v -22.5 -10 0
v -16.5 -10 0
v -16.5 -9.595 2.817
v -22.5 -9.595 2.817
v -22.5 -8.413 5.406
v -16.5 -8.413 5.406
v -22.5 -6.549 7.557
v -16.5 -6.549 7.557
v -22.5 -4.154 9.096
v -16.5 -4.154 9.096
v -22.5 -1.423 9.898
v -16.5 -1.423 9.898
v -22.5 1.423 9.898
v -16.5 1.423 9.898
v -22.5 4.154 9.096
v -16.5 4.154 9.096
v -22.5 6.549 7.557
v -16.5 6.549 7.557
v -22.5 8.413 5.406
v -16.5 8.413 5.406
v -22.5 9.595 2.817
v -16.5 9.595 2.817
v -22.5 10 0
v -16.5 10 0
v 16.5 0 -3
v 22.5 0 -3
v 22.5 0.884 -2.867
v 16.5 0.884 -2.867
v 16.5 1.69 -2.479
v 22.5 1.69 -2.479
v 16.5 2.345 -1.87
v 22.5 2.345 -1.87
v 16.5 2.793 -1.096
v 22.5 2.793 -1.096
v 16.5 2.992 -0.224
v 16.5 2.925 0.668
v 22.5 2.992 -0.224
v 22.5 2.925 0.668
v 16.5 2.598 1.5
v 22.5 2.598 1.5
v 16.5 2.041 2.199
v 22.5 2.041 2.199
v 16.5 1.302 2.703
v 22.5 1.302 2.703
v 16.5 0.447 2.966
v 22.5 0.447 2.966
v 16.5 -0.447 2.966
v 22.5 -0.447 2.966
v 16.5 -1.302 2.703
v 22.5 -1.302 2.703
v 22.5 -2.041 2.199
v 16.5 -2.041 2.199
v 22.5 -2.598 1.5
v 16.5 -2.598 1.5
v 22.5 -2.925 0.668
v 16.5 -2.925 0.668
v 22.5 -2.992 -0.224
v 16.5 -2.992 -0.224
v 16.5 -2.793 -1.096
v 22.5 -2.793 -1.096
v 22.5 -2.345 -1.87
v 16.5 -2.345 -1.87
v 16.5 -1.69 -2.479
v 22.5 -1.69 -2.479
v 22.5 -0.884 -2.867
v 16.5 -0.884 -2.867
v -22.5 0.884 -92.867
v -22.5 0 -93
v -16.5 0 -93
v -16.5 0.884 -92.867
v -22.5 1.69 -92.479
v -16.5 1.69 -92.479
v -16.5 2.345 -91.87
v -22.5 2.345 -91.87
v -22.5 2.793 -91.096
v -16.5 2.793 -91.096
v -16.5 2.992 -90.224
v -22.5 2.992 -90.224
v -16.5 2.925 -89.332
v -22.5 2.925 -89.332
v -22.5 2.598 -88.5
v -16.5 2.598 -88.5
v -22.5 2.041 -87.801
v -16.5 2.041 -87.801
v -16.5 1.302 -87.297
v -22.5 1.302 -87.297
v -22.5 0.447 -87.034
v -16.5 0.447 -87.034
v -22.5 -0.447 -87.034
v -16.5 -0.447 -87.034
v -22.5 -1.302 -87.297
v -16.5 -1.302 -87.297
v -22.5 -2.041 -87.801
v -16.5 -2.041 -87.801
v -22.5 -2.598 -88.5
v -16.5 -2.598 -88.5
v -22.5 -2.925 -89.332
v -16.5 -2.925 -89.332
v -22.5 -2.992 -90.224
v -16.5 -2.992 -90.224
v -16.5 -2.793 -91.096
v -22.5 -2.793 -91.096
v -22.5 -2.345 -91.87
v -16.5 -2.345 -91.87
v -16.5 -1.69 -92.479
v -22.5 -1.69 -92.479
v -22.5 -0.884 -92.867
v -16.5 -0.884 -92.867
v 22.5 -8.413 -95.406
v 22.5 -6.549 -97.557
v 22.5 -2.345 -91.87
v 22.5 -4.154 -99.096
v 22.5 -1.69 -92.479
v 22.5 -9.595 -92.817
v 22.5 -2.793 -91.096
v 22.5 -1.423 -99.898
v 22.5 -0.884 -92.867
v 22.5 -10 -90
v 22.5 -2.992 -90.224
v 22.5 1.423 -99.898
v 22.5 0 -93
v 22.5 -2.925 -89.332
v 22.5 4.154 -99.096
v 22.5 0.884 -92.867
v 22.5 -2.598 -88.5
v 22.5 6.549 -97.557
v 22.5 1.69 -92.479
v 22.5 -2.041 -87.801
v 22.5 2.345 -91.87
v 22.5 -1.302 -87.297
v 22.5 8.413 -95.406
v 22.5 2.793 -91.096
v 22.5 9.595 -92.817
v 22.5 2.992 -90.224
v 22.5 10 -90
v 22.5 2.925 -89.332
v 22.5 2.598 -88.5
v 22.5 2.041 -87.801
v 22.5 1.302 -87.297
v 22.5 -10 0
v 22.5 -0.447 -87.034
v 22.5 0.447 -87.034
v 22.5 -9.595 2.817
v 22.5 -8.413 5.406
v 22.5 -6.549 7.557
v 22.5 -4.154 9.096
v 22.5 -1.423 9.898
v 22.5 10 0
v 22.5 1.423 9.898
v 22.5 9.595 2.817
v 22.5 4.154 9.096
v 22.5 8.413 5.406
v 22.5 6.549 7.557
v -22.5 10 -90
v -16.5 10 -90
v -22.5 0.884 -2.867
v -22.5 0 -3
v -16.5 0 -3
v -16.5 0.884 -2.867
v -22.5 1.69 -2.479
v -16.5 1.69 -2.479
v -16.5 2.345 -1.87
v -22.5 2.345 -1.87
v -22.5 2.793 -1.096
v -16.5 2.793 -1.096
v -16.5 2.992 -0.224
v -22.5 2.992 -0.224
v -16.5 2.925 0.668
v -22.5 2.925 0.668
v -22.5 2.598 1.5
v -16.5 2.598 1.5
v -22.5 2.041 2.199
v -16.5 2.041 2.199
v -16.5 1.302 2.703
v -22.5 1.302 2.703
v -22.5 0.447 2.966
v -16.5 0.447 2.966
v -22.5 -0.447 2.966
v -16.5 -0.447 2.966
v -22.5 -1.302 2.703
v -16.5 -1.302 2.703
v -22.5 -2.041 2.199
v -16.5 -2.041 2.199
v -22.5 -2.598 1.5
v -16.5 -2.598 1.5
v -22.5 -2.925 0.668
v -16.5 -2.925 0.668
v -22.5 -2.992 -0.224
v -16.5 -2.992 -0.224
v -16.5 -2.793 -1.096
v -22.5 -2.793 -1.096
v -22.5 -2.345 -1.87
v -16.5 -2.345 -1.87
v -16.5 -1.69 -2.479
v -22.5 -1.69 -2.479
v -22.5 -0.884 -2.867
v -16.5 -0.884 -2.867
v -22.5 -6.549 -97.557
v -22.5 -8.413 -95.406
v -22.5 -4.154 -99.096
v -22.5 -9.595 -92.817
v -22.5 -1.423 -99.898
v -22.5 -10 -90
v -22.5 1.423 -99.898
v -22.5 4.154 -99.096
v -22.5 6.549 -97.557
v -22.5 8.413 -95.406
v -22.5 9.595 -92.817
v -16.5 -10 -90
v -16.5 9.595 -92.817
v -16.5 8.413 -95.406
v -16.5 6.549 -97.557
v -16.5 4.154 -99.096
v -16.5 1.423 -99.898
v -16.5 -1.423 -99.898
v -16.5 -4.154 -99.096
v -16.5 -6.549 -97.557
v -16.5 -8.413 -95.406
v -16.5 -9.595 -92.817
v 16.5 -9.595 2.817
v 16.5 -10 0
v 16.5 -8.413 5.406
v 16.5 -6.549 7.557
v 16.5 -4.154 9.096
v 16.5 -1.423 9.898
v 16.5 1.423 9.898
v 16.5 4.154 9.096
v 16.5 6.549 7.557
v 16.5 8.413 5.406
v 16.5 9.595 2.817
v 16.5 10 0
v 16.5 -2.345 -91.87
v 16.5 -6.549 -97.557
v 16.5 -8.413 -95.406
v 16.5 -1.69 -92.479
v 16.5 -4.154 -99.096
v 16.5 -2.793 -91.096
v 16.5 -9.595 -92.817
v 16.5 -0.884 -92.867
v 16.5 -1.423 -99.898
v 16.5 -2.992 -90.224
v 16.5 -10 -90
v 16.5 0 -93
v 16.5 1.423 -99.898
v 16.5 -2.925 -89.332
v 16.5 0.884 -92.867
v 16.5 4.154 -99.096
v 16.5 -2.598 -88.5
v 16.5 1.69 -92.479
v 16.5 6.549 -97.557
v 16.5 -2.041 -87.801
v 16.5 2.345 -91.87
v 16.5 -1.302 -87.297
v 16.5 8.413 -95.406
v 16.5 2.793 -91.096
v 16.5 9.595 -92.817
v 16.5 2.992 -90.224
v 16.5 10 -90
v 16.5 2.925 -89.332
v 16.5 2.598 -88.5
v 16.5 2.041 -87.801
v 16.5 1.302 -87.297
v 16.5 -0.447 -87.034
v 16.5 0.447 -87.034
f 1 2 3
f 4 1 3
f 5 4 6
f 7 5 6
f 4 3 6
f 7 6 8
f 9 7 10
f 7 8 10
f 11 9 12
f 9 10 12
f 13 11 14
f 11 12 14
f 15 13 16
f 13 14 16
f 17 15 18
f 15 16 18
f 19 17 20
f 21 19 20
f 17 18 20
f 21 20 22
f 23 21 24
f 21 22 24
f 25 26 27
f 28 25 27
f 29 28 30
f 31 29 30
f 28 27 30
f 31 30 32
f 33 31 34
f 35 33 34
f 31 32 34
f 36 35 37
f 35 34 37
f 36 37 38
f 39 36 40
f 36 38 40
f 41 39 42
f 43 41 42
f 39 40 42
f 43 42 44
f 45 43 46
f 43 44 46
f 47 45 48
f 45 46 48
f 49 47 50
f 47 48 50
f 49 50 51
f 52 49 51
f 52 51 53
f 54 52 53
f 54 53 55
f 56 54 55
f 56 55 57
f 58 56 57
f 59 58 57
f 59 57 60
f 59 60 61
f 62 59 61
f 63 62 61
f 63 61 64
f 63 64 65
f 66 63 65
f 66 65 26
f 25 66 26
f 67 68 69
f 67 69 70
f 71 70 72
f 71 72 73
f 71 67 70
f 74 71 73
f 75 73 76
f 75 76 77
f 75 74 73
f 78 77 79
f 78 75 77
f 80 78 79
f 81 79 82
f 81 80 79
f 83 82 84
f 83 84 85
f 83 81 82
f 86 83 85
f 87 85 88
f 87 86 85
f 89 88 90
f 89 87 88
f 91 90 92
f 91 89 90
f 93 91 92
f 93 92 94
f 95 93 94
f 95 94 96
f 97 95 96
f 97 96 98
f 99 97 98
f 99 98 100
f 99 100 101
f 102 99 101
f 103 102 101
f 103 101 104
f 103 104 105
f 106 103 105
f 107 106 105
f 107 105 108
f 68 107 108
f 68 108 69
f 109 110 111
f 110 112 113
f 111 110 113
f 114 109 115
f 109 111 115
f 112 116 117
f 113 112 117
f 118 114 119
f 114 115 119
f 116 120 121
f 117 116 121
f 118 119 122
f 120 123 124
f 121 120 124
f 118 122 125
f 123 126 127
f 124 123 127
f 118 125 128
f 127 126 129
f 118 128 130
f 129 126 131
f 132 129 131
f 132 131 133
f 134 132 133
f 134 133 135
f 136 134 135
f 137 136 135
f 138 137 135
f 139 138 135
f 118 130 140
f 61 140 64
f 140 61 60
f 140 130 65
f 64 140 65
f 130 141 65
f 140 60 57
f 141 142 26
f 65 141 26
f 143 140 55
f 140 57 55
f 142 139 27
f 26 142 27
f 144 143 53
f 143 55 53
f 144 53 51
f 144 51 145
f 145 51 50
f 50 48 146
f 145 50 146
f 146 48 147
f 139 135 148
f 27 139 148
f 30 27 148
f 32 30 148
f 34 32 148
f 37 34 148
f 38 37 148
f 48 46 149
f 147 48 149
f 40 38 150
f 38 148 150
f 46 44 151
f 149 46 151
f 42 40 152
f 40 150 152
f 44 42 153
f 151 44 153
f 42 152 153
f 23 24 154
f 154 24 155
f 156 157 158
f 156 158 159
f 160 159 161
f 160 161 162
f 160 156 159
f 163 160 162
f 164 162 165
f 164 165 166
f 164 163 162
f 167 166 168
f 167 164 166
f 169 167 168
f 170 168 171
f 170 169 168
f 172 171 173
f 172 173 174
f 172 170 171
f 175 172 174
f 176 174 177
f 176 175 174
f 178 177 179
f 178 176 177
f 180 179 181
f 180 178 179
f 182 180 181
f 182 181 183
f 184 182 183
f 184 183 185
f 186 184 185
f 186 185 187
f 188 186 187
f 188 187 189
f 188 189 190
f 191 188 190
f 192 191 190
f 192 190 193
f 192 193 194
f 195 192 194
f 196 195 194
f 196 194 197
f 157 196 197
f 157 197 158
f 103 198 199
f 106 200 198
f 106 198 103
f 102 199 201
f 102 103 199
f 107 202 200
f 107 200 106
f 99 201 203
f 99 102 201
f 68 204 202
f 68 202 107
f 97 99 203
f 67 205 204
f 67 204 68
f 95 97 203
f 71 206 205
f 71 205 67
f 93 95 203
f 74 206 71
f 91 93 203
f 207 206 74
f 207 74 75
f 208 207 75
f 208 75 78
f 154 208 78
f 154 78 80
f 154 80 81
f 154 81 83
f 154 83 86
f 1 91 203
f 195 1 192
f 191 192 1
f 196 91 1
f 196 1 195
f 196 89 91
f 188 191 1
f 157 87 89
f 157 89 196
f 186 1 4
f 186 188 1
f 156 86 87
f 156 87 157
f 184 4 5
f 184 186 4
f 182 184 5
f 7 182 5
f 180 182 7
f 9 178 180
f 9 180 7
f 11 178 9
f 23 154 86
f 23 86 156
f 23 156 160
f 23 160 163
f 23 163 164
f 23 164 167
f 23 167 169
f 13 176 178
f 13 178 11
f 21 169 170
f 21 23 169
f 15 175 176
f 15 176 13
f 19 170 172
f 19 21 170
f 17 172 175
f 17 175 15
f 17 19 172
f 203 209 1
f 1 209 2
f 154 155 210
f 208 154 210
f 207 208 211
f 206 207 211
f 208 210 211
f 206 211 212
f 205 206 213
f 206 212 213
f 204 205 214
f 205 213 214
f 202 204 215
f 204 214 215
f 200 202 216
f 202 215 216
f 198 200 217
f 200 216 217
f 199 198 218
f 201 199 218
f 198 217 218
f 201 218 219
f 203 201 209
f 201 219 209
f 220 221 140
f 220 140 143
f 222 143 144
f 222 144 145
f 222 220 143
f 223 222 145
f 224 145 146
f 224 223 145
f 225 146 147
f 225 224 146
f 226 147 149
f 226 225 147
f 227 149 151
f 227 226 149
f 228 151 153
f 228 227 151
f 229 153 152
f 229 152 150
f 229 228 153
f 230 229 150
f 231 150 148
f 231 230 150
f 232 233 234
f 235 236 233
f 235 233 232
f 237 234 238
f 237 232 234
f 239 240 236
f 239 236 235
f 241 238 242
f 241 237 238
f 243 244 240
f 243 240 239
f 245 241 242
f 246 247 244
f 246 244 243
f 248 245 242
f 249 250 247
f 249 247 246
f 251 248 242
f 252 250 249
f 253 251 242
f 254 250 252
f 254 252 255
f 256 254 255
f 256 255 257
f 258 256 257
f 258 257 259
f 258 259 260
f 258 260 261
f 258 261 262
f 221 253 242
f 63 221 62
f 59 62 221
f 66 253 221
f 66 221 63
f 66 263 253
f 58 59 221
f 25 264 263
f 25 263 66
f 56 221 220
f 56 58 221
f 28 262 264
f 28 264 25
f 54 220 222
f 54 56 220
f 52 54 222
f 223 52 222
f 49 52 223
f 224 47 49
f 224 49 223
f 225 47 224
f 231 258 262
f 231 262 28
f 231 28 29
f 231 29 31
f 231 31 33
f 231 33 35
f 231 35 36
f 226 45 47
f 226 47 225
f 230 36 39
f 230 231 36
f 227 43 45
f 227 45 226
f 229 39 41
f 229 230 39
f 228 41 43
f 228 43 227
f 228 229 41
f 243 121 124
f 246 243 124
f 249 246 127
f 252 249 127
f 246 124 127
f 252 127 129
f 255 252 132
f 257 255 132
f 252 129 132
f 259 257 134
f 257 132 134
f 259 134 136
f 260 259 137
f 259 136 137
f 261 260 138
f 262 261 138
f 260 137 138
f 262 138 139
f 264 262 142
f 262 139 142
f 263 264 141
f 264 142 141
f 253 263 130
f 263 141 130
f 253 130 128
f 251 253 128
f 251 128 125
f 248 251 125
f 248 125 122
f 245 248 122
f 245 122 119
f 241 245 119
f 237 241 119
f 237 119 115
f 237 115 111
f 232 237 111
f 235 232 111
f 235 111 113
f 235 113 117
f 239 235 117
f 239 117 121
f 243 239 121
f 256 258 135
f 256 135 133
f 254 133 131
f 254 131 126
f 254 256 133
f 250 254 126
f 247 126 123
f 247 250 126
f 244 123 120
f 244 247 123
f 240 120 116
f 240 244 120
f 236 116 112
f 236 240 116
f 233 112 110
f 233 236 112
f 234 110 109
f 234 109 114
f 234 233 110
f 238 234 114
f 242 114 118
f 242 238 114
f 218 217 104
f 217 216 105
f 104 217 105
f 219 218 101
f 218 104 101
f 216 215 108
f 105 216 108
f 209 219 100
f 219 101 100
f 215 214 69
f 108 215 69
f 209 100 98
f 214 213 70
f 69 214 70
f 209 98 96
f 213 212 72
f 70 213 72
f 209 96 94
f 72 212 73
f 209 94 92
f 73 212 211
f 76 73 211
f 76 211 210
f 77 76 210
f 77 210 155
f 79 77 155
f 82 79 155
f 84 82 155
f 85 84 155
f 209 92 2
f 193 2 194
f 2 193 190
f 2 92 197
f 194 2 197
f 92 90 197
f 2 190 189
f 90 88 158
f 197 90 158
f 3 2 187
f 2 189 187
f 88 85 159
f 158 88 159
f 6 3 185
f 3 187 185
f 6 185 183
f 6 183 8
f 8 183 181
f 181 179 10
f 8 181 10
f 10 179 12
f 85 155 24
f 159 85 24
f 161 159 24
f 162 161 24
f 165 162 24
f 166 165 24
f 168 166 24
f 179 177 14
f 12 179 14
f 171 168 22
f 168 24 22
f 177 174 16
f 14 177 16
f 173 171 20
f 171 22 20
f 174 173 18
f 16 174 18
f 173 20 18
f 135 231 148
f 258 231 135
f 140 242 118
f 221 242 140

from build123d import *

# Parameters (mm, degrees)
BOSS_EXTRUDE1_DEPTH     = 6
SKETCH2_R               = 3
CUT_EXTRUDE1_DEPTH      = 1
CUT_EXTRUDE1_DEPTH_BACK = 7


with BuildPart() as part:
    # Sketch1 → Boss-Extrude1 (new body)
    with BuildSketch(Plane(origin=(16.5, 0, 0), x_dir=(0, 0, -1), z_dir=(1, 0, 0))):
        with BuildLine():
            Line((0, 10), (90, 10))
            ThreePointArc((90, 10), (100, 0), (90, -10))
            Line((90, -10), (0, -10))
            ThreePointArc((0, -10), (-10, 0), (0, 10))
        make_face()
    extrude(amount=BOSS_EXTRUDE1_DEPTH)

    # Sketch2 → Cut-Extrude1 (cut, two sides)
    with BuildSketch(Plane(origin=(22.5, 0, 0), x_dir=(0, 0, -1), z_dir=(1, 0, 0))) as cut_extrude1_sk:
        Circle(SKETCH2_R)
        with Locations((90, 0)):
            Circle(SKETCH2_R)
    extrude(amount=CUT_EXTRUDE1_DEPTH, mode=Mode.SUBTRACT)
    extrude(cut_extrude1_sk.sketch, amount=-CUT_EXTRUDE1_DEPTH_BACK, mode=Mode.SUBTRACT)


with BuildPart() as body_2:
    # Mirror4: mirrored copy
    add(part.part.mirror(Plane(origin=(0, 0, 0), x_dir=(0, 0, 1), z_dir=(1, 0, 0))))


solid = Compound([part.part, body_2.part])
